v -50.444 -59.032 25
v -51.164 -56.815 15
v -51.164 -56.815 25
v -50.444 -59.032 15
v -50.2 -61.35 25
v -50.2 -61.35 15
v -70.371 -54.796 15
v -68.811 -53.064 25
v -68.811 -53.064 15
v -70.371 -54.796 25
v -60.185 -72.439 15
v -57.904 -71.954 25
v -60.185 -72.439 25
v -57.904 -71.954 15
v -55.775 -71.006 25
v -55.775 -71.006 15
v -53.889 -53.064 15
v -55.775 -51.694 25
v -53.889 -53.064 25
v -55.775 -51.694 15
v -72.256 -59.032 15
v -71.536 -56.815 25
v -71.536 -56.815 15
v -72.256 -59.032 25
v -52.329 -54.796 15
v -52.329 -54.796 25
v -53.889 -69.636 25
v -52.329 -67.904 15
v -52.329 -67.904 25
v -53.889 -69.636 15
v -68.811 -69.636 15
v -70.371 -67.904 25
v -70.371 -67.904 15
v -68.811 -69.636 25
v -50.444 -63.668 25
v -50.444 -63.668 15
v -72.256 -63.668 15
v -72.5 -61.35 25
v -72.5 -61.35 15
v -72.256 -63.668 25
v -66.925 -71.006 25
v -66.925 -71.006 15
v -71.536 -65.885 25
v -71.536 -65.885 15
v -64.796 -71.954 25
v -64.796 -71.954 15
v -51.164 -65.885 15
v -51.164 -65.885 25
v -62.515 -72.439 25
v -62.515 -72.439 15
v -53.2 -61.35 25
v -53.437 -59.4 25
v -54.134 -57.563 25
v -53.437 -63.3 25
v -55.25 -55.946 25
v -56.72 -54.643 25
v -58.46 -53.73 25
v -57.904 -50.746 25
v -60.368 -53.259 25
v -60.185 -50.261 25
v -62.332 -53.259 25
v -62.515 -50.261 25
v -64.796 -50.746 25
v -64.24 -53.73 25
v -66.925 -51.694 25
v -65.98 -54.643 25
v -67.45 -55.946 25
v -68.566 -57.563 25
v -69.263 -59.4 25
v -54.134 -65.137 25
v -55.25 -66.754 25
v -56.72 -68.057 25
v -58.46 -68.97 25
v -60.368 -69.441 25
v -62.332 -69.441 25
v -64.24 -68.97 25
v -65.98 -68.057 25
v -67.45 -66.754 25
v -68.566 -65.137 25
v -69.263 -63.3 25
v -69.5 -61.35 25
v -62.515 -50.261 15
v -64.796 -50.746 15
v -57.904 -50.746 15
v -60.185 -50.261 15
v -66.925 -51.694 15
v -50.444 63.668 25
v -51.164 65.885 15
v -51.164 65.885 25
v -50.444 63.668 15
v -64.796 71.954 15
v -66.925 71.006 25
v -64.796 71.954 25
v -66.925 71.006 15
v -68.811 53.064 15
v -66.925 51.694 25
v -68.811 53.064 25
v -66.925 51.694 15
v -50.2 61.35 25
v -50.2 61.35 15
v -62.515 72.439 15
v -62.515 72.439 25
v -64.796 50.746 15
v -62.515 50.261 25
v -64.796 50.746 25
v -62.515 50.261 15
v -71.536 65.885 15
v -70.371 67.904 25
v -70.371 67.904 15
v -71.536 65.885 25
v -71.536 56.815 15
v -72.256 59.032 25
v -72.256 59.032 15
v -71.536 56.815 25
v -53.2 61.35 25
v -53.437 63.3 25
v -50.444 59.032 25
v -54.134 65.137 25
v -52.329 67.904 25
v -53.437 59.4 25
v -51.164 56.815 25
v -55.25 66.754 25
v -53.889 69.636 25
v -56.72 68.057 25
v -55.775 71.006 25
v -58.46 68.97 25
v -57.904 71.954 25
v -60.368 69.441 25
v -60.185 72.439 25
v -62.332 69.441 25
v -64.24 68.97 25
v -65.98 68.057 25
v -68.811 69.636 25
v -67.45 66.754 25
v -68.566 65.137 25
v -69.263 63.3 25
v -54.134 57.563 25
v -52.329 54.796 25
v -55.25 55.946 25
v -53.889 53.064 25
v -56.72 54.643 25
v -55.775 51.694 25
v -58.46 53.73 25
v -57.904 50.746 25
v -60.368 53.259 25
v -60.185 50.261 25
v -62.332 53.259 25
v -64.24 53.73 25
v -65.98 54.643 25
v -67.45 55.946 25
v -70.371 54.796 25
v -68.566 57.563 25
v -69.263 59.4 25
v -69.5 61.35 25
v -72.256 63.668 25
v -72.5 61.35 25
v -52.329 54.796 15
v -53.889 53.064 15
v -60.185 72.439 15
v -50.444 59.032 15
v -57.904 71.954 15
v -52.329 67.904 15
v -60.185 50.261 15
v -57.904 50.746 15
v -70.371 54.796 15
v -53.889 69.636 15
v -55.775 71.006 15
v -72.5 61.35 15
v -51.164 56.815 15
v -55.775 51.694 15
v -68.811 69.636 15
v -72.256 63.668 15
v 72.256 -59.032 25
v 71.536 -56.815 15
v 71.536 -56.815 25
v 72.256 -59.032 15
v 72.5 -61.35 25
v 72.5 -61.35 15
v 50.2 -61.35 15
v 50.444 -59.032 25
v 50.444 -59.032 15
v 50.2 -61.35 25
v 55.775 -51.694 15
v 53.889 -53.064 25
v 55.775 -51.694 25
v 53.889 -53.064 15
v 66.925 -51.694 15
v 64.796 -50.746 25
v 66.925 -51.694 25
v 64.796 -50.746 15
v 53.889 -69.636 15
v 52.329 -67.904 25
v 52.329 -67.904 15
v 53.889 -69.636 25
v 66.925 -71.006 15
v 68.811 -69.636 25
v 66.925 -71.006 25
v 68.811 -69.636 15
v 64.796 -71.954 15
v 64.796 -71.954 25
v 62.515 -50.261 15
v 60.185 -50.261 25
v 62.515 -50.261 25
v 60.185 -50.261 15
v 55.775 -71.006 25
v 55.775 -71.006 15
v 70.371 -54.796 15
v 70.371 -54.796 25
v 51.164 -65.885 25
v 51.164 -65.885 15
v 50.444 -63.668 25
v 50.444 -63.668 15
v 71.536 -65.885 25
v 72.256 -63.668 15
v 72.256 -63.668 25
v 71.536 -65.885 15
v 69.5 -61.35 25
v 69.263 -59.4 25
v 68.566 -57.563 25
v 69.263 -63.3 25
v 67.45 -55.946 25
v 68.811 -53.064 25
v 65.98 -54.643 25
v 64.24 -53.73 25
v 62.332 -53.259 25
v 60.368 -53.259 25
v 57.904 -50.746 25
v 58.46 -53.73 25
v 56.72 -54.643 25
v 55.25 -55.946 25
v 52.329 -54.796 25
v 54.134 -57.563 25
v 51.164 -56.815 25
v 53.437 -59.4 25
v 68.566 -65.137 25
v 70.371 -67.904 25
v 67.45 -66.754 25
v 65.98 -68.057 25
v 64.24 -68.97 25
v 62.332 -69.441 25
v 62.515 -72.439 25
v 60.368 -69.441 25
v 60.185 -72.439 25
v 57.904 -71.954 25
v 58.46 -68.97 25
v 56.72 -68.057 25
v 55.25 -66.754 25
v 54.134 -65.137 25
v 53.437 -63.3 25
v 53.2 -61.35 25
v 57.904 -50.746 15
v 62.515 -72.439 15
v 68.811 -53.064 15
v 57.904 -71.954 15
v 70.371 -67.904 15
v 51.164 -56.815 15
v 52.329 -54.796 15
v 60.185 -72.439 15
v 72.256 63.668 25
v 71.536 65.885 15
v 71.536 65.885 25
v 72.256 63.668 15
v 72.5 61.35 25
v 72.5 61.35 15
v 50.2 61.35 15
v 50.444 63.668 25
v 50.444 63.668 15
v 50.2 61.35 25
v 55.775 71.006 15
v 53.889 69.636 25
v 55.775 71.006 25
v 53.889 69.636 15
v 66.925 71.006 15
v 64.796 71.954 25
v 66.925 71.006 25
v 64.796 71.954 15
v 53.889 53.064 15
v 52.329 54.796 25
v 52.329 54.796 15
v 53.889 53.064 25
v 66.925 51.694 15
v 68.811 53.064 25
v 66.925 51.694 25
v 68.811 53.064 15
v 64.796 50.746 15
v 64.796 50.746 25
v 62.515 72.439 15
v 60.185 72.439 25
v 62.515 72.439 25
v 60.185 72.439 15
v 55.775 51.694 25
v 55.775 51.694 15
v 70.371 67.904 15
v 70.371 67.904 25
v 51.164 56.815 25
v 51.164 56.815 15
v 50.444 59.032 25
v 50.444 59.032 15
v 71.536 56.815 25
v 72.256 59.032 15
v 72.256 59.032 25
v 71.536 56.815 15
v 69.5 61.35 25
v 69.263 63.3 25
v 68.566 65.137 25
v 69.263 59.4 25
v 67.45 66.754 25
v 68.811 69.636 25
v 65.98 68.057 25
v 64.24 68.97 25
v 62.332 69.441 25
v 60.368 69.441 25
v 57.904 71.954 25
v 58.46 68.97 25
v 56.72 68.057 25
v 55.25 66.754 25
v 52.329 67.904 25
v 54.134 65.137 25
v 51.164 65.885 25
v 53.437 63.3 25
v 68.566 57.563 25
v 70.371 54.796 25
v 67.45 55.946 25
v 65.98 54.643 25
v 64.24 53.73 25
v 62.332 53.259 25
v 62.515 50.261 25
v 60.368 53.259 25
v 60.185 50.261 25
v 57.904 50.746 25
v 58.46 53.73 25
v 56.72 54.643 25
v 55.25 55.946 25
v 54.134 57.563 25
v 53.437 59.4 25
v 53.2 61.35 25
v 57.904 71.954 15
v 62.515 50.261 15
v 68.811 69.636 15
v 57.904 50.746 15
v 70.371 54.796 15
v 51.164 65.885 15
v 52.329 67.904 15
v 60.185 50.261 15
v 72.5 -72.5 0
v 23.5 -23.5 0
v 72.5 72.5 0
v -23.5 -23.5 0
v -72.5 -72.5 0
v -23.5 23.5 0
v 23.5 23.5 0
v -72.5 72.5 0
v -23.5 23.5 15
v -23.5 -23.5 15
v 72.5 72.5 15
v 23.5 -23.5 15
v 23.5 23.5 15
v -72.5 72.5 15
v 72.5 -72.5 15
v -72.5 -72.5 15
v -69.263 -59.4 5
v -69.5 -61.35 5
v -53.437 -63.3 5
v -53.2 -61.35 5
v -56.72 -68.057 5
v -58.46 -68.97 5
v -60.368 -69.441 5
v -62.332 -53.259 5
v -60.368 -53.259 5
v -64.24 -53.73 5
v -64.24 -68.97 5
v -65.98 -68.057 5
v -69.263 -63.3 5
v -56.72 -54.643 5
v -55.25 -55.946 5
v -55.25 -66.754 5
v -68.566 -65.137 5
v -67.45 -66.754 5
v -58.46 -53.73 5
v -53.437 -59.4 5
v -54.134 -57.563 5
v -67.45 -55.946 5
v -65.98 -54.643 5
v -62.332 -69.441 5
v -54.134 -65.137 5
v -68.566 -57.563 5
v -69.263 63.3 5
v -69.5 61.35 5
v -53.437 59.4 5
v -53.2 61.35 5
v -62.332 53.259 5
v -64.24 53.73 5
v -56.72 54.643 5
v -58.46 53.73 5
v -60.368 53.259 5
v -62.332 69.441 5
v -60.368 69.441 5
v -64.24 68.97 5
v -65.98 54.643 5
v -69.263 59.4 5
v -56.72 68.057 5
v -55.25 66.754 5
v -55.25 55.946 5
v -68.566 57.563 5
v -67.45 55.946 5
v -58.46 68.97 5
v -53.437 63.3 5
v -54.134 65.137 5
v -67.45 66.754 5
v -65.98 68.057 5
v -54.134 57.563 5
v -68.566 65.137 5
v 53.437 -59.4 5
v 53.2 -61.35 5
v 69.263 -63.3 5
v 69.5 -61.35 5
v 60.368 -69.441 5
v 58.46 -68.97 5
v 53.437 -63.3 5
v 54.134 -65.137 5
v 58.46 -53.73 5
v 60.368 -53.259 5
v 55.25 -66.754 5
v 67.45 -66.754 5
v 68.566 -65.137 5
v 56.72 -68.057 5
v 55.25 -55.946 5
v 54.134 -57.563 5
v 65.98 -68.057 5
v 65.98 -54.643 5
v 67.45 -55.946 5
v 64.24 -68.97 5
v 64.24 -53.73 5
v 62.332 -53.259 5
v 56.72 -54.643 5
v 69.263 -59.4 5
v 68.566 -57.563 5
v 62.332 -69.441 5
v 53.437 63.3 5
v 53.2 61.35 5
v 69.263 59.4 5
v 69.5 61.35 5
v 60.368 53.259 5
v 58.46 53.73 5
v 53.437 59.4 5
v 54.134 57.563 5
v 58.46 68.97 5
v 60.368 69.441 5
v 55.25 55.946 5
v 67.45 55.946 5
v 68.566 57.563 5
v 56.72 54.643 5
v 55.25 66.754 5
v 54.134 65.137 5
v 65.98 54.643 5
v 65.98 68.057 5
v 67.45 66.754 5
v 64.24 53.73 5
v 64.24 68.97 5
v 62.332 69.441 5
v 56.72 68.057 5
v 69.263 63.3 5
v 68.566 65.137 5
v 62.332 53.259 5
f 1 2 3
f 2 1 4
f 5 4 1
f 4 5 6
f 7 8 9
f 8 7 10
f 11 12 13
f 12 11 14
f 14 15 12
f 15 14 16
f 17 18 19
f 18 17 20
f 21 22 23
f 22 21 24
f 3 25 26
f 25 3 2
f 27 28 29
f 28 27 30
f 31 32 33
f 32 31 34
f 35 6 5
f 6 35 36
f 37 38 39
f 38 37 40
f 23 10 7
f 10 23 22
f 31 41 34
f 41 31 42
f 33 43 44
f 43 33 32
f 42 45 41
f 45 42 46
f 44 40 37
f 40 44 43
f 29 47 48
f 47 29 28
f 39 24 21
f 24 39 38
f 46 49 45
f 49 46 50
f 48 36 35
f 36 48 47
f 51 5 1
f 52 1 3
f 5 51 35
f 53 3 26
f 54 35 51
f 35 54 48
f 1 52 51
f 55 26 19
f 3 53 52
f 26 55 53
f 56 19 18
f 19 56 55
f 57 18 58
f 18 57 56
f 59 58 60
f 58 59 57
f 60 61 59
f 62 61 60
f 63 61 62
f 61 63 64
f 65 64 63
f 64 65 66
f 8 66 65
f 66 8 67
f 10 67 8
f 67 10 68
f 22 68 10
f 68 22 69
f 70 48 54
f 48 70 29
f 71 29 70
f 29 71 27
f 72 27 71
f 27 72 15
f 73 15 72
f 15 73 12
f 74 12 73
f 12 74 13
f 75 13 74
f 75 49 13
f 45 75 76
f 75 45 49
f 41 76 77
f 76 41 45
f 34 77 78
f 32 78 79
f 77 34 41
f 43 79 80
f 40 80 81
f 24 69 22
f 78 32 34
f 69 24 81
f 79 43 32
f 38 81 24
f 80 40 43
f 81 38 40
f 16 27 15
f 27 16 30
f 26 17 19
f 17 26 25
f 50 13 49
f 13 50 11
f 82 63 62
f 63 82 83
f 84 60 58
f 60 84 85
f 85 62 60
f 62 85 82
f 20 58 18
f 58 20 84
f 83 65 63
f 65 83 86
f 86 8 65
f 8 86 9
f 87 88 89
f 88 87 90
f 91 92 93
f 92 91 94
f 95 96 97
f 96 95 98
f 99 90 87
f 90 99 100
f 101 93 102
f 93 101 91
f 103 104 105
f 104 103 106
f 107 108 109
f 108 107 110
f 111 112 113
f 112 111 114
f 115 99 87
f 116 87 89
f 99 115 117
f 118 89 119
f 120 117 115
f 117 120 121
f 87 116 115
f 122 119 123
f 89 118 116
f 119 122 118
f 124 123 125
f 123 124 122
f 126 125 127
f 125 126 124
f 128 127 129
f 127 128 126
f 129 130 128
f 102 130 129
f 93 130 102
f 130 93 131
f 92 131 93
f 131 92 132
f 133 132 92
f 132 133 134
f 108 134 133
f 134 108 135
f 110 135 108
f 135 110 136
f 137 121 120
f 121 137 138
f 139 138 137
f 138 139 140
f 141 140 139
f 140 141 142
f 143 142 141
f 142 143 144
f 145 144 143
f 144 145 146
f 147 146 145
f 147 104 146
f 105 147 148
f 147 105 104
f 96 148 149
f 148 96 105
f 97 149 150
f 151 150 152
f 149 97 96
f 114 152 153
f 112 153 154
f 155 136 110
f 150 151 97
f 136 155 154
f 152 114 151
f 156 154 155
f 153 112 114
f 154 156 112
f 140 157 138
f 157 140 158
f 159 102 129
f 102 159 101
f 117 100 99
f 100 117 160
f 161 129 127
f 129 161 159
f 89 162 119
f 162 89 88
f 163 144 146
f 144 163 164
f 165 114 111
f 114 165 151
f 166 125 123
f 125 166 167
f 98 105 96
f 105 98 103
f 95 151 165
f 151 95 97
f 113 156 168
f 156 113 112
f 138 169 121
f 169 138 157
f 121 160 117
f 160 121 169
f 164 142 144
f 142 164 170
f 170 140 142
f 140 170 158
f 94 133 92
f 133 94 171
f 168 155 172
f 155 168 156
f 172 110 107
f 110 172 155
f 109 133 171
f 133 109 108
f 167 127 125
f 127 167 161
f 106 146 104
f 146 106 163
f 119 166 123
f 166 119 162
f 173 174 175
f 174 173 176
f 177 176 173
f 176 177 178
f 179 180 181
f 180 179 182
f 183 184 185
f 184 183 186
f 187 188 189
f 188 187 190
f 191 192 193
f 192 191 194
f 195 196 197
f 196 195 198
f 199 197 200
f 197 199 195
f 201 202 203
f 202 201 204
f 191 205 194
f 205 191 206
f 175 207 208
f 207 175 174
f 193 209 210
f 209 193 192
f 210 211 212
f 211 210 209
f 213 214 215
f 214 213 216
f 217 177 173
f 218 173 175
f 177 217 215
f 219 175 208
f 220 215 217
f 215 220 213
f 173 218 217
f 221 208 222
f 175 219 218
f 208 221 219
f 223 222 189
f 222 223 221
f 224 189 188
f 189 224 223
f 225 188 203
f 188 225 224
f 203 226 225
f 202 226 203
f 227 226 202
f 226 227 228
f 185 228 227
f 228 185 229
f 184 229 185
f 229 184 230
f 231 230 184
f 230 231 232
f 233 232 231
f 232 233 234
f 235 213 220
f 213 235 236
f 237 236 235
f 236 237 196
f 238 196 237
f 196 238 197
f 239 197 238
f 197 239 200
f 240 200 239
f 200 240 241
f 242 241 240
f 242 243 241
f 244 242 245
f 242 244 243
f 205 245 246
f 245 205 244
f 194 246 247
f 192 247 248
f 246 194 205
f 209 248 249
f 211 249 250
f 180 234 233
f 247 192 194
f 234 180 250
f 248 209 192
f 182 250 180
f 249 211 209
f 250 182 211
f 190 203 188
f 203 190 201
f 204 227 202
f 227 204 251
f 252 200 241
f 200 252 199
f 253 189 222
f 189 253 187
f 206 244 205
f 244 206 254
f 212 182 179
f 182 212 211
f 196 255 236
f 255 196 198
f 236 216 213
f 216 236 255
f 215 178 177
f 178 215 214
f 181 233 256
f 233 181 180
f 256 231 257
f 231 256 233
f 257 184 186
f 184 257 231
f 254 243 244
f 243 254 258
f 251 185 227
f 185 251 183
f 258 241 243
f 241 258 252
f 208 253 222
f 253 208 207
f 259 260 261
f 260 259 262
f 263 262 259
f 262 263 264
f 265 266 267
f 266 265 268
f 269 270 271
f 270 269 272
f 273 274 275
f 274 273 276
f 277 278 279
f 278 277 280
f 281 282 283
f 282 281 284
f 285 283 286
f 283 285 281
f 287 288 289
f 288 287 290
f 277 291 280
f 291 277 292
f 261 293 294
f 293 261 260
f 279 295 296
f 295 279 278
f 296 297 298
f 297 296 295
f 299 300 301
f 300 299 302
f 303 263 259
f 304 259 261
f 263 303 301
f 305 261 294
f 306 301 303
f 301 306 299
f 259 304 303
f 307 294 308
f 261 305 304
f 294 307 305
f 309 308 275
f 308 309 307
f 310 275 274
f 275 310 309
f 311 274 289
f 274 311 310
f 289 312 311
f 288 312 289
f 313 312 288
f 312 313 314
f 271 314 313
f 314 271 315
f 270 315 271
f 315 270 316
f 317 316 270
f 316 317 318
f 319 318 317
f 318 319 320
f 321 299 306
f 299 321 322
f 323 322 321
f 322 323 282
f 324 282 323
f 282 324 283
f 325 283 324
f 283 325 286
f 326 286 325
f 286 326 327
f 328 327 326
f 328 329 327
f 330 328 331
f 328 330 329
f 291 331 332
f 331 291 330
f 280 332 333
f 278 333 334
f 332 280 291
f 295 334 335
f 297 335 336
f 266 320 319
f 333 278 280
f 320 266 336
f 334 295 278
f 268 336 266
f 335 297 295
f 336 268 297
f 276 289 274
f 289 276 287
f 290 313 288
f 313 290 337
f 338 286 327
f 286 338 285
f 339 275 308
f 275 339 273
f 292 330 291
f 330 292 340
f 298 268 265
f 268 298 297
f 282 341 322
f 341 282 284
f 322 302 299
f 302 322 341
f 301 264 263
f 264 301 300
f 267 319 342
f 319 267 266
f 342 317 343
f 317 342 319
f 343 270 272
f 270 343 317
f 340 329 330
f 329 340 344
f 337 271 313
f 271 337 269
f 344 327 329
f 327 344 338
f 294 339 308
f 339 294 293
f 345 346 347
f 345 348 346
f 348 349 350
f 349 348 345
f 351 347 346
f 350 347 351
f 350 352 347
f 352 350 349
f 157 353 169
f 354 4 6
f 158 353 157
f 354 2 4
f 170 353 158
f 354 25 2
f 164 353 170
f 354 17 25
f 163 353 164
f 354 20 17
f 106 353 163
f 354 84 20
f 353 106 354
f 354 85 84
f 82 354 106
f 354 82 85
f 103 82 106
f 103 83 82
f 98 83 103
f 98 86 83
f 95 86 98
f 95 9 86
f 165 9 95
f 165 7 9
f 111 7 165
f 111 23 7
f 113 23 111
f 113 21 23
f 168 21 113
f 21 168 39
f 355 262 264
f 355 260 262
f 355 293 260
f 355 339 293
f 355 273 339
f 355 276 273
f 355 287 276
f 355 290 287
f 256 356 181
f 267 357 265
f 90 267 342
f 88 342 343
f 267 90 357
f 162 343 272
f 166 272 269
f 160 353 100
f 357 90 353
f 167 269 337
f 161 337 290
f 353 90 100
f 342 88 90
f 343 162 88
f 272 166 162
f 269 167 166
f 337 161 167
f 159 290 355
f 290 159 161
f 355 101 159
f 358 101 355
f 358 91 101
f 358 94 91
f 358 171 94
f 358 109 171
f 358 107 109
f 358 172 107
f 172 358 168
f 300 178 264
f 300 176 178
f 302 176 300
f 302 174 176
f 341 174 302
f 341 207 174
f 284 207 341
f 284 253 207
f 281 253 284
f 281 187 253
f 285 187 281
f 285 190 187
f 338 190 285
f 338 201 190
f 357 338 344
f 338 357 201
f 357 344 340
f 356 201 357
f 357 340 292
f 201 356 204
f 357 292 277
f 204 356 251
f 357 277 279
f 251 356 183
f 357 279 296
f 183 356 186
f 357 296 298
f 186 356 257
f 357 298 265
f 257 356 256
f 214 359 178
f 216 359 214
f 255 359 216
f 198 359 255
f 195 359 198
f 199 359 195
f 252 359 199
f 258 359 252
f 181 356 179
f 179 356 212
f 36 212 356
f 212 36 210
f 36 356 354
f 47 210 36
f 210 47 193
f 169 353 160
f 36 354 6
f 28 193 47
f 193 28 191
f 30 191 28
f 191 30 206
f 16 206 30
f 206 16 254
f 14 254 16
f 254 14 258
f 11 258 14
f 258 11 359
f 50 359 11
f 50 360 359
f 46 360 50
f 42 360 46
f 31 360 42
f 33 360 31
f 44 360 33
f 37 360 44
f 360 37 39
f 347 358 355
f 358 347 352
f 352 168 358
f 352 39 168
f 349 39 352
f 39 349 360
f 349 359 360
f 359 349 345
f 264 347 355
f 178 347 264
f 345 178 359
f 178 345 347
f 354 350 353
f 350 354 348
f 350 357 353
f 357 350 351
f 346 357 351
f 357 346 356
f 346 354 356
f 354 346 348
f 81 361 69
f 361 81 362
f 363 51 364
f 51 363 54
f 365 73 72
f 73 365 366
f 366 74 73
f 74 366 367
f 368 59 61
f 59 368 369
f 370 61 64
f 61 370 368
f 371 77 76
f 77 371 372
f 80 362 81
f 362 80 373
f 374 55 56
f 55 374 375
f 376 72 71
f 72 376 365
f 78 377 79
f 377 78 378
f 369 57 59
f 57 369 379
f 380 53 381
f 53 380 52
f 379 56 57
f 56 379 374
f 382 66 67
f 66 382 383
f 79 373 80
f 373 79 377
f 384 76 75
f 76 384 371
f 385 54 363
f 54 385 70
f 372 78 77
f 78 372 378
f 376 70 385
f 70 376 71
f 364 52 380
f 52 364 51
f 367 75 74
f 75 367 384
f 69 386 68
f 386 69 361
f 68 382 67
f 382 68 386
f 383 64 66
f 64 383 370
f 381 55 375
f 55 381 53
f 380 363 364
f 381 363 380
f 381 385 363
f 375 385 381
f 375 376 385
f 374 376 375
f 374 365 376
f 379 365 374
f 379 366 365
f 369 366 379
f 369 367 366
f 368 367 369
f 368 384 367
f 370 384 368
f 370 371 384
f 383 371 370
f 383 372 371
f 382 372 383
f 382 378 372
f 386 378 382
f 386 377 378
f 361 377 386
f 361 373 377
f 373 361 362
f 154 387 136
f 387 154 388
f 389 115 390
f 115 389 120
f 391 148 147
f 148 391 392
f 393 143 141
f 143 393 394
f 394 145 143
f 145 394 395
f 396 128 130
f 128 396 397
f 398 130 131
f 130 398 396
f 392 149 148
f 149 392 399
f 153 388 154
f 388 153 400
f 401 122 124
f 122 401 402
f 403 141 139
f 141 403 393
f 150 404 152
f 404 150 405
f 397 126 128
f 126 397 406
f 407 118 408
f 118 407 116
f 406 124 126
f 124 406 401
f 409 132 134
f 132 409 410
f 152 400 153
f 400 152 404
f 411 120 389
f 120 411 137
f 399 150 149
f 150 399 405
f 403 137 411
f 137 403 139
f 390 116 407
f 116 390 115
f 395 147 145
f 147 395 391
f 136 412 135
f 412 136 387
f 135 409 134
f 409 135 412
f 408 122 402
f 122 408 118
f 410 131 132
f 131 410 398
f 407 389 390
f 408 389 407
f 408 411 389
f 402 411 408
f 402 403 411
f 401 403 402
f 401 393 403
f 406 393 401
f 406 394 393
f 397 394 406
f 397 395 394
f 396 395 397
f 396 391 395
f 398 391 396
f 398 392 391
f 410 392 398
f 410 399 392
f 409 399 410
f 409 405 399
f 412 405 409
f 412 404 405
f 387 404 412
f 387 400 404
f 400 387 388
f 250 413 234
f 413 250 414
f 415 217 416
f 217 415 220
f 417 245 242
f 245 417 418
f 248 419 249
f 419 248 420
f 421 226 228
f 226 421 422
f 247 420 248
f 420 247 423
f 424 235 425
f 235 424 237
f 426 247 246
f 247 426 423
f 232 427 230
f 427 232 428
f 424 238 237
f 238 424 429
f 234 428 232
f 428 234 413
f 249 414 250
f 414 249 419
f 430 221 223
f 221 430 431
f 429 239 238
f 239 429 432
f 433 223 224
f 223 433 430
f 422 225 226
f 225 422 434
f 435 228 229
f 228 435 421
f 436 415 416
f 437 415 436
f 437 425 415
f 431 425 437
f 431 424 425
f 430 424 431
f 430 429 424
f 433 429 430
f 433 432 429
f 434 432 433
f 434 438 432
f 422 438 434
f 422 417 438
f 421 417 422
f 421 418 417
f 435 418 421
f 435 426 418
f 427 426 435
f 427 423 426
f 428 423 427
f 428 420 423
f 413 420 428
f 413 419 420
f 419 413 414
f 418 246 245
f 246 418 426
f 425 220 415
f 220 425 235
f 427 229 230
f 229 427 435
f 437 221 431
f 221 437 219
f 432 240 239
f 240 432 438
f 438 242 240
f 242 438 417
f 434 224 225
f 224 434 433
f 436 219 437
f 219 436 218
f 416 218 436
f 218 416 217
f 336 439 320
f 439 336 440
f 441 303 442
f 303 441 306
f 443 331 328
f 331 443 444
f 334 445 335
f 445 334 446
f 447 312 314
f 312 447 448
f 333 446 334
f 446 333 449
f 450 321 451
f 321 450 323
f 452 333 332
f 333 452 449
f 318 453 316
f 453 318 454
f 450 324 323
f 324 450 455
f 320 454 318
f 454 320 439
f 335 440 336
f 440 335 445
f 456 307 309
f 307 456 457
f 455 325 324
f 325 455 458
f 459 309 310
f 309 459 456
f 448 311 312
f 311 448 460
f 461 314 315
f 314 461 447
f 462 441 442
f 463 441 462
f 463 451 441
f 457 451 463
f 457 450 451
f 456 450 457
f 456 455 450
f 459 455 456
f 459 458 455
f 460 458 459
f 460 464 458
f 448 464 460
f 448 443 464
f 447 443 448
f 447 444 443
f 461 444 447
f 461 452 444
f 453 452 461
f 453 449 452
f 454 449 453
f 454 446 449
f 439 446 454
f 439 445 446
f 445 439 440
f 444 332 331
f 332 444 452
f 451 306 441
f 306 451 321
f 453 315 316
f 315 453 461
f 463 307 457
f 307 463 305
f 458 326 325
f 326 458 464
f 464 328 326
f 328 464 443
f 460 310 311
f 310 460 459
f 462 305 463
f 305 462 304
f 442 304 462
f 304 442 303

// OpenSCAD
// Generated by SolidPython 0.4.7 on 2020-04-10 19:30:12


difference() {
	union() {
		translate(v = [-61.3500000000, -61.3500000000, 5]) {
			linear_extrude(height = 20) {
				circle(d = 22.3000000000);
			}
		}
		translate(v = [-61.3500000000, 61.3500000000, 5]) {
			linear_extrude(height = 20) {
				circle(d = 22.3000000000);
			}
		}
		translate(v = [61.3500000000, -61.3500000000, 5]) {
			linear_extrude(height = 20) {
				circle(d = 22.3000000000);
			}
		}
		translate(v = [61.3500000000, 61.3500000000, 5]) {
			linear_extrude(height = 20) {
				circle(d = 22.3000000000);
			}
		}
		linear_extrude(height = 15) {
			difference() {
				square(center = true, size = 145);
				square(center = true, size = 47);
			}
		}
	}
	union() {
		translate(v = [-61.3500000000, -61.3500000000, 5]) {
			linear_extrude(height = 24) {
				circle(d = 16.3000000000);
			}
		}
		translate(v = [-61.3500000000, 61.3500000000, 5]) {
			linear_extrude(height = 24) {
				circle(d = 16.3000000000);
			}
		}
		translate(v = [61.3500000000, -61.3500000000, 5]) {
			linear_extrude(height = 24) {
				circle(d = 16.3000000000);
			}
		}
		translate(v = [61.3500000000, 61.3500000000, 5]) {
			linear_extrude(height = 24) {
				circle(d = 16.3000000000);
			}
		}
	}
}
/***********************************************
*********      SolidPython code:      **********
************************************************
 
from .lib.grinder_base import GrinderBase
from .lib.dell_connector import DellConnector
from .lib.holder.round_holder import RoundHolder

from solid import *
from solid.utils import *  # Not required, but the utils module is useful





#connector = DellConnector(x_holders=4, y_holders=2)

#scad = connector.rotate_to_print(connector.multiple_dell_holder())
#scad = connector.multiple_dell_holder()



#top = GrinderBase.custom_diameter(90, 17).platform()
#scad_render_to_file(top, "coffee-grinder_base.scad")


base = GrinderBase().platform()
scad_render_to_file(base, "coffee-grinder_base.scad")


round_holder = RoundHolder().completeHolder()
scad_render_to_file(round_holder, "coffee-round-holder.scad")

connector = linear_extrude(height=30)(square(47, center=True)-square(40, center=True))
scad_render_to_file(connector, "coffee-connector.scad")
 
 
************************************************/
